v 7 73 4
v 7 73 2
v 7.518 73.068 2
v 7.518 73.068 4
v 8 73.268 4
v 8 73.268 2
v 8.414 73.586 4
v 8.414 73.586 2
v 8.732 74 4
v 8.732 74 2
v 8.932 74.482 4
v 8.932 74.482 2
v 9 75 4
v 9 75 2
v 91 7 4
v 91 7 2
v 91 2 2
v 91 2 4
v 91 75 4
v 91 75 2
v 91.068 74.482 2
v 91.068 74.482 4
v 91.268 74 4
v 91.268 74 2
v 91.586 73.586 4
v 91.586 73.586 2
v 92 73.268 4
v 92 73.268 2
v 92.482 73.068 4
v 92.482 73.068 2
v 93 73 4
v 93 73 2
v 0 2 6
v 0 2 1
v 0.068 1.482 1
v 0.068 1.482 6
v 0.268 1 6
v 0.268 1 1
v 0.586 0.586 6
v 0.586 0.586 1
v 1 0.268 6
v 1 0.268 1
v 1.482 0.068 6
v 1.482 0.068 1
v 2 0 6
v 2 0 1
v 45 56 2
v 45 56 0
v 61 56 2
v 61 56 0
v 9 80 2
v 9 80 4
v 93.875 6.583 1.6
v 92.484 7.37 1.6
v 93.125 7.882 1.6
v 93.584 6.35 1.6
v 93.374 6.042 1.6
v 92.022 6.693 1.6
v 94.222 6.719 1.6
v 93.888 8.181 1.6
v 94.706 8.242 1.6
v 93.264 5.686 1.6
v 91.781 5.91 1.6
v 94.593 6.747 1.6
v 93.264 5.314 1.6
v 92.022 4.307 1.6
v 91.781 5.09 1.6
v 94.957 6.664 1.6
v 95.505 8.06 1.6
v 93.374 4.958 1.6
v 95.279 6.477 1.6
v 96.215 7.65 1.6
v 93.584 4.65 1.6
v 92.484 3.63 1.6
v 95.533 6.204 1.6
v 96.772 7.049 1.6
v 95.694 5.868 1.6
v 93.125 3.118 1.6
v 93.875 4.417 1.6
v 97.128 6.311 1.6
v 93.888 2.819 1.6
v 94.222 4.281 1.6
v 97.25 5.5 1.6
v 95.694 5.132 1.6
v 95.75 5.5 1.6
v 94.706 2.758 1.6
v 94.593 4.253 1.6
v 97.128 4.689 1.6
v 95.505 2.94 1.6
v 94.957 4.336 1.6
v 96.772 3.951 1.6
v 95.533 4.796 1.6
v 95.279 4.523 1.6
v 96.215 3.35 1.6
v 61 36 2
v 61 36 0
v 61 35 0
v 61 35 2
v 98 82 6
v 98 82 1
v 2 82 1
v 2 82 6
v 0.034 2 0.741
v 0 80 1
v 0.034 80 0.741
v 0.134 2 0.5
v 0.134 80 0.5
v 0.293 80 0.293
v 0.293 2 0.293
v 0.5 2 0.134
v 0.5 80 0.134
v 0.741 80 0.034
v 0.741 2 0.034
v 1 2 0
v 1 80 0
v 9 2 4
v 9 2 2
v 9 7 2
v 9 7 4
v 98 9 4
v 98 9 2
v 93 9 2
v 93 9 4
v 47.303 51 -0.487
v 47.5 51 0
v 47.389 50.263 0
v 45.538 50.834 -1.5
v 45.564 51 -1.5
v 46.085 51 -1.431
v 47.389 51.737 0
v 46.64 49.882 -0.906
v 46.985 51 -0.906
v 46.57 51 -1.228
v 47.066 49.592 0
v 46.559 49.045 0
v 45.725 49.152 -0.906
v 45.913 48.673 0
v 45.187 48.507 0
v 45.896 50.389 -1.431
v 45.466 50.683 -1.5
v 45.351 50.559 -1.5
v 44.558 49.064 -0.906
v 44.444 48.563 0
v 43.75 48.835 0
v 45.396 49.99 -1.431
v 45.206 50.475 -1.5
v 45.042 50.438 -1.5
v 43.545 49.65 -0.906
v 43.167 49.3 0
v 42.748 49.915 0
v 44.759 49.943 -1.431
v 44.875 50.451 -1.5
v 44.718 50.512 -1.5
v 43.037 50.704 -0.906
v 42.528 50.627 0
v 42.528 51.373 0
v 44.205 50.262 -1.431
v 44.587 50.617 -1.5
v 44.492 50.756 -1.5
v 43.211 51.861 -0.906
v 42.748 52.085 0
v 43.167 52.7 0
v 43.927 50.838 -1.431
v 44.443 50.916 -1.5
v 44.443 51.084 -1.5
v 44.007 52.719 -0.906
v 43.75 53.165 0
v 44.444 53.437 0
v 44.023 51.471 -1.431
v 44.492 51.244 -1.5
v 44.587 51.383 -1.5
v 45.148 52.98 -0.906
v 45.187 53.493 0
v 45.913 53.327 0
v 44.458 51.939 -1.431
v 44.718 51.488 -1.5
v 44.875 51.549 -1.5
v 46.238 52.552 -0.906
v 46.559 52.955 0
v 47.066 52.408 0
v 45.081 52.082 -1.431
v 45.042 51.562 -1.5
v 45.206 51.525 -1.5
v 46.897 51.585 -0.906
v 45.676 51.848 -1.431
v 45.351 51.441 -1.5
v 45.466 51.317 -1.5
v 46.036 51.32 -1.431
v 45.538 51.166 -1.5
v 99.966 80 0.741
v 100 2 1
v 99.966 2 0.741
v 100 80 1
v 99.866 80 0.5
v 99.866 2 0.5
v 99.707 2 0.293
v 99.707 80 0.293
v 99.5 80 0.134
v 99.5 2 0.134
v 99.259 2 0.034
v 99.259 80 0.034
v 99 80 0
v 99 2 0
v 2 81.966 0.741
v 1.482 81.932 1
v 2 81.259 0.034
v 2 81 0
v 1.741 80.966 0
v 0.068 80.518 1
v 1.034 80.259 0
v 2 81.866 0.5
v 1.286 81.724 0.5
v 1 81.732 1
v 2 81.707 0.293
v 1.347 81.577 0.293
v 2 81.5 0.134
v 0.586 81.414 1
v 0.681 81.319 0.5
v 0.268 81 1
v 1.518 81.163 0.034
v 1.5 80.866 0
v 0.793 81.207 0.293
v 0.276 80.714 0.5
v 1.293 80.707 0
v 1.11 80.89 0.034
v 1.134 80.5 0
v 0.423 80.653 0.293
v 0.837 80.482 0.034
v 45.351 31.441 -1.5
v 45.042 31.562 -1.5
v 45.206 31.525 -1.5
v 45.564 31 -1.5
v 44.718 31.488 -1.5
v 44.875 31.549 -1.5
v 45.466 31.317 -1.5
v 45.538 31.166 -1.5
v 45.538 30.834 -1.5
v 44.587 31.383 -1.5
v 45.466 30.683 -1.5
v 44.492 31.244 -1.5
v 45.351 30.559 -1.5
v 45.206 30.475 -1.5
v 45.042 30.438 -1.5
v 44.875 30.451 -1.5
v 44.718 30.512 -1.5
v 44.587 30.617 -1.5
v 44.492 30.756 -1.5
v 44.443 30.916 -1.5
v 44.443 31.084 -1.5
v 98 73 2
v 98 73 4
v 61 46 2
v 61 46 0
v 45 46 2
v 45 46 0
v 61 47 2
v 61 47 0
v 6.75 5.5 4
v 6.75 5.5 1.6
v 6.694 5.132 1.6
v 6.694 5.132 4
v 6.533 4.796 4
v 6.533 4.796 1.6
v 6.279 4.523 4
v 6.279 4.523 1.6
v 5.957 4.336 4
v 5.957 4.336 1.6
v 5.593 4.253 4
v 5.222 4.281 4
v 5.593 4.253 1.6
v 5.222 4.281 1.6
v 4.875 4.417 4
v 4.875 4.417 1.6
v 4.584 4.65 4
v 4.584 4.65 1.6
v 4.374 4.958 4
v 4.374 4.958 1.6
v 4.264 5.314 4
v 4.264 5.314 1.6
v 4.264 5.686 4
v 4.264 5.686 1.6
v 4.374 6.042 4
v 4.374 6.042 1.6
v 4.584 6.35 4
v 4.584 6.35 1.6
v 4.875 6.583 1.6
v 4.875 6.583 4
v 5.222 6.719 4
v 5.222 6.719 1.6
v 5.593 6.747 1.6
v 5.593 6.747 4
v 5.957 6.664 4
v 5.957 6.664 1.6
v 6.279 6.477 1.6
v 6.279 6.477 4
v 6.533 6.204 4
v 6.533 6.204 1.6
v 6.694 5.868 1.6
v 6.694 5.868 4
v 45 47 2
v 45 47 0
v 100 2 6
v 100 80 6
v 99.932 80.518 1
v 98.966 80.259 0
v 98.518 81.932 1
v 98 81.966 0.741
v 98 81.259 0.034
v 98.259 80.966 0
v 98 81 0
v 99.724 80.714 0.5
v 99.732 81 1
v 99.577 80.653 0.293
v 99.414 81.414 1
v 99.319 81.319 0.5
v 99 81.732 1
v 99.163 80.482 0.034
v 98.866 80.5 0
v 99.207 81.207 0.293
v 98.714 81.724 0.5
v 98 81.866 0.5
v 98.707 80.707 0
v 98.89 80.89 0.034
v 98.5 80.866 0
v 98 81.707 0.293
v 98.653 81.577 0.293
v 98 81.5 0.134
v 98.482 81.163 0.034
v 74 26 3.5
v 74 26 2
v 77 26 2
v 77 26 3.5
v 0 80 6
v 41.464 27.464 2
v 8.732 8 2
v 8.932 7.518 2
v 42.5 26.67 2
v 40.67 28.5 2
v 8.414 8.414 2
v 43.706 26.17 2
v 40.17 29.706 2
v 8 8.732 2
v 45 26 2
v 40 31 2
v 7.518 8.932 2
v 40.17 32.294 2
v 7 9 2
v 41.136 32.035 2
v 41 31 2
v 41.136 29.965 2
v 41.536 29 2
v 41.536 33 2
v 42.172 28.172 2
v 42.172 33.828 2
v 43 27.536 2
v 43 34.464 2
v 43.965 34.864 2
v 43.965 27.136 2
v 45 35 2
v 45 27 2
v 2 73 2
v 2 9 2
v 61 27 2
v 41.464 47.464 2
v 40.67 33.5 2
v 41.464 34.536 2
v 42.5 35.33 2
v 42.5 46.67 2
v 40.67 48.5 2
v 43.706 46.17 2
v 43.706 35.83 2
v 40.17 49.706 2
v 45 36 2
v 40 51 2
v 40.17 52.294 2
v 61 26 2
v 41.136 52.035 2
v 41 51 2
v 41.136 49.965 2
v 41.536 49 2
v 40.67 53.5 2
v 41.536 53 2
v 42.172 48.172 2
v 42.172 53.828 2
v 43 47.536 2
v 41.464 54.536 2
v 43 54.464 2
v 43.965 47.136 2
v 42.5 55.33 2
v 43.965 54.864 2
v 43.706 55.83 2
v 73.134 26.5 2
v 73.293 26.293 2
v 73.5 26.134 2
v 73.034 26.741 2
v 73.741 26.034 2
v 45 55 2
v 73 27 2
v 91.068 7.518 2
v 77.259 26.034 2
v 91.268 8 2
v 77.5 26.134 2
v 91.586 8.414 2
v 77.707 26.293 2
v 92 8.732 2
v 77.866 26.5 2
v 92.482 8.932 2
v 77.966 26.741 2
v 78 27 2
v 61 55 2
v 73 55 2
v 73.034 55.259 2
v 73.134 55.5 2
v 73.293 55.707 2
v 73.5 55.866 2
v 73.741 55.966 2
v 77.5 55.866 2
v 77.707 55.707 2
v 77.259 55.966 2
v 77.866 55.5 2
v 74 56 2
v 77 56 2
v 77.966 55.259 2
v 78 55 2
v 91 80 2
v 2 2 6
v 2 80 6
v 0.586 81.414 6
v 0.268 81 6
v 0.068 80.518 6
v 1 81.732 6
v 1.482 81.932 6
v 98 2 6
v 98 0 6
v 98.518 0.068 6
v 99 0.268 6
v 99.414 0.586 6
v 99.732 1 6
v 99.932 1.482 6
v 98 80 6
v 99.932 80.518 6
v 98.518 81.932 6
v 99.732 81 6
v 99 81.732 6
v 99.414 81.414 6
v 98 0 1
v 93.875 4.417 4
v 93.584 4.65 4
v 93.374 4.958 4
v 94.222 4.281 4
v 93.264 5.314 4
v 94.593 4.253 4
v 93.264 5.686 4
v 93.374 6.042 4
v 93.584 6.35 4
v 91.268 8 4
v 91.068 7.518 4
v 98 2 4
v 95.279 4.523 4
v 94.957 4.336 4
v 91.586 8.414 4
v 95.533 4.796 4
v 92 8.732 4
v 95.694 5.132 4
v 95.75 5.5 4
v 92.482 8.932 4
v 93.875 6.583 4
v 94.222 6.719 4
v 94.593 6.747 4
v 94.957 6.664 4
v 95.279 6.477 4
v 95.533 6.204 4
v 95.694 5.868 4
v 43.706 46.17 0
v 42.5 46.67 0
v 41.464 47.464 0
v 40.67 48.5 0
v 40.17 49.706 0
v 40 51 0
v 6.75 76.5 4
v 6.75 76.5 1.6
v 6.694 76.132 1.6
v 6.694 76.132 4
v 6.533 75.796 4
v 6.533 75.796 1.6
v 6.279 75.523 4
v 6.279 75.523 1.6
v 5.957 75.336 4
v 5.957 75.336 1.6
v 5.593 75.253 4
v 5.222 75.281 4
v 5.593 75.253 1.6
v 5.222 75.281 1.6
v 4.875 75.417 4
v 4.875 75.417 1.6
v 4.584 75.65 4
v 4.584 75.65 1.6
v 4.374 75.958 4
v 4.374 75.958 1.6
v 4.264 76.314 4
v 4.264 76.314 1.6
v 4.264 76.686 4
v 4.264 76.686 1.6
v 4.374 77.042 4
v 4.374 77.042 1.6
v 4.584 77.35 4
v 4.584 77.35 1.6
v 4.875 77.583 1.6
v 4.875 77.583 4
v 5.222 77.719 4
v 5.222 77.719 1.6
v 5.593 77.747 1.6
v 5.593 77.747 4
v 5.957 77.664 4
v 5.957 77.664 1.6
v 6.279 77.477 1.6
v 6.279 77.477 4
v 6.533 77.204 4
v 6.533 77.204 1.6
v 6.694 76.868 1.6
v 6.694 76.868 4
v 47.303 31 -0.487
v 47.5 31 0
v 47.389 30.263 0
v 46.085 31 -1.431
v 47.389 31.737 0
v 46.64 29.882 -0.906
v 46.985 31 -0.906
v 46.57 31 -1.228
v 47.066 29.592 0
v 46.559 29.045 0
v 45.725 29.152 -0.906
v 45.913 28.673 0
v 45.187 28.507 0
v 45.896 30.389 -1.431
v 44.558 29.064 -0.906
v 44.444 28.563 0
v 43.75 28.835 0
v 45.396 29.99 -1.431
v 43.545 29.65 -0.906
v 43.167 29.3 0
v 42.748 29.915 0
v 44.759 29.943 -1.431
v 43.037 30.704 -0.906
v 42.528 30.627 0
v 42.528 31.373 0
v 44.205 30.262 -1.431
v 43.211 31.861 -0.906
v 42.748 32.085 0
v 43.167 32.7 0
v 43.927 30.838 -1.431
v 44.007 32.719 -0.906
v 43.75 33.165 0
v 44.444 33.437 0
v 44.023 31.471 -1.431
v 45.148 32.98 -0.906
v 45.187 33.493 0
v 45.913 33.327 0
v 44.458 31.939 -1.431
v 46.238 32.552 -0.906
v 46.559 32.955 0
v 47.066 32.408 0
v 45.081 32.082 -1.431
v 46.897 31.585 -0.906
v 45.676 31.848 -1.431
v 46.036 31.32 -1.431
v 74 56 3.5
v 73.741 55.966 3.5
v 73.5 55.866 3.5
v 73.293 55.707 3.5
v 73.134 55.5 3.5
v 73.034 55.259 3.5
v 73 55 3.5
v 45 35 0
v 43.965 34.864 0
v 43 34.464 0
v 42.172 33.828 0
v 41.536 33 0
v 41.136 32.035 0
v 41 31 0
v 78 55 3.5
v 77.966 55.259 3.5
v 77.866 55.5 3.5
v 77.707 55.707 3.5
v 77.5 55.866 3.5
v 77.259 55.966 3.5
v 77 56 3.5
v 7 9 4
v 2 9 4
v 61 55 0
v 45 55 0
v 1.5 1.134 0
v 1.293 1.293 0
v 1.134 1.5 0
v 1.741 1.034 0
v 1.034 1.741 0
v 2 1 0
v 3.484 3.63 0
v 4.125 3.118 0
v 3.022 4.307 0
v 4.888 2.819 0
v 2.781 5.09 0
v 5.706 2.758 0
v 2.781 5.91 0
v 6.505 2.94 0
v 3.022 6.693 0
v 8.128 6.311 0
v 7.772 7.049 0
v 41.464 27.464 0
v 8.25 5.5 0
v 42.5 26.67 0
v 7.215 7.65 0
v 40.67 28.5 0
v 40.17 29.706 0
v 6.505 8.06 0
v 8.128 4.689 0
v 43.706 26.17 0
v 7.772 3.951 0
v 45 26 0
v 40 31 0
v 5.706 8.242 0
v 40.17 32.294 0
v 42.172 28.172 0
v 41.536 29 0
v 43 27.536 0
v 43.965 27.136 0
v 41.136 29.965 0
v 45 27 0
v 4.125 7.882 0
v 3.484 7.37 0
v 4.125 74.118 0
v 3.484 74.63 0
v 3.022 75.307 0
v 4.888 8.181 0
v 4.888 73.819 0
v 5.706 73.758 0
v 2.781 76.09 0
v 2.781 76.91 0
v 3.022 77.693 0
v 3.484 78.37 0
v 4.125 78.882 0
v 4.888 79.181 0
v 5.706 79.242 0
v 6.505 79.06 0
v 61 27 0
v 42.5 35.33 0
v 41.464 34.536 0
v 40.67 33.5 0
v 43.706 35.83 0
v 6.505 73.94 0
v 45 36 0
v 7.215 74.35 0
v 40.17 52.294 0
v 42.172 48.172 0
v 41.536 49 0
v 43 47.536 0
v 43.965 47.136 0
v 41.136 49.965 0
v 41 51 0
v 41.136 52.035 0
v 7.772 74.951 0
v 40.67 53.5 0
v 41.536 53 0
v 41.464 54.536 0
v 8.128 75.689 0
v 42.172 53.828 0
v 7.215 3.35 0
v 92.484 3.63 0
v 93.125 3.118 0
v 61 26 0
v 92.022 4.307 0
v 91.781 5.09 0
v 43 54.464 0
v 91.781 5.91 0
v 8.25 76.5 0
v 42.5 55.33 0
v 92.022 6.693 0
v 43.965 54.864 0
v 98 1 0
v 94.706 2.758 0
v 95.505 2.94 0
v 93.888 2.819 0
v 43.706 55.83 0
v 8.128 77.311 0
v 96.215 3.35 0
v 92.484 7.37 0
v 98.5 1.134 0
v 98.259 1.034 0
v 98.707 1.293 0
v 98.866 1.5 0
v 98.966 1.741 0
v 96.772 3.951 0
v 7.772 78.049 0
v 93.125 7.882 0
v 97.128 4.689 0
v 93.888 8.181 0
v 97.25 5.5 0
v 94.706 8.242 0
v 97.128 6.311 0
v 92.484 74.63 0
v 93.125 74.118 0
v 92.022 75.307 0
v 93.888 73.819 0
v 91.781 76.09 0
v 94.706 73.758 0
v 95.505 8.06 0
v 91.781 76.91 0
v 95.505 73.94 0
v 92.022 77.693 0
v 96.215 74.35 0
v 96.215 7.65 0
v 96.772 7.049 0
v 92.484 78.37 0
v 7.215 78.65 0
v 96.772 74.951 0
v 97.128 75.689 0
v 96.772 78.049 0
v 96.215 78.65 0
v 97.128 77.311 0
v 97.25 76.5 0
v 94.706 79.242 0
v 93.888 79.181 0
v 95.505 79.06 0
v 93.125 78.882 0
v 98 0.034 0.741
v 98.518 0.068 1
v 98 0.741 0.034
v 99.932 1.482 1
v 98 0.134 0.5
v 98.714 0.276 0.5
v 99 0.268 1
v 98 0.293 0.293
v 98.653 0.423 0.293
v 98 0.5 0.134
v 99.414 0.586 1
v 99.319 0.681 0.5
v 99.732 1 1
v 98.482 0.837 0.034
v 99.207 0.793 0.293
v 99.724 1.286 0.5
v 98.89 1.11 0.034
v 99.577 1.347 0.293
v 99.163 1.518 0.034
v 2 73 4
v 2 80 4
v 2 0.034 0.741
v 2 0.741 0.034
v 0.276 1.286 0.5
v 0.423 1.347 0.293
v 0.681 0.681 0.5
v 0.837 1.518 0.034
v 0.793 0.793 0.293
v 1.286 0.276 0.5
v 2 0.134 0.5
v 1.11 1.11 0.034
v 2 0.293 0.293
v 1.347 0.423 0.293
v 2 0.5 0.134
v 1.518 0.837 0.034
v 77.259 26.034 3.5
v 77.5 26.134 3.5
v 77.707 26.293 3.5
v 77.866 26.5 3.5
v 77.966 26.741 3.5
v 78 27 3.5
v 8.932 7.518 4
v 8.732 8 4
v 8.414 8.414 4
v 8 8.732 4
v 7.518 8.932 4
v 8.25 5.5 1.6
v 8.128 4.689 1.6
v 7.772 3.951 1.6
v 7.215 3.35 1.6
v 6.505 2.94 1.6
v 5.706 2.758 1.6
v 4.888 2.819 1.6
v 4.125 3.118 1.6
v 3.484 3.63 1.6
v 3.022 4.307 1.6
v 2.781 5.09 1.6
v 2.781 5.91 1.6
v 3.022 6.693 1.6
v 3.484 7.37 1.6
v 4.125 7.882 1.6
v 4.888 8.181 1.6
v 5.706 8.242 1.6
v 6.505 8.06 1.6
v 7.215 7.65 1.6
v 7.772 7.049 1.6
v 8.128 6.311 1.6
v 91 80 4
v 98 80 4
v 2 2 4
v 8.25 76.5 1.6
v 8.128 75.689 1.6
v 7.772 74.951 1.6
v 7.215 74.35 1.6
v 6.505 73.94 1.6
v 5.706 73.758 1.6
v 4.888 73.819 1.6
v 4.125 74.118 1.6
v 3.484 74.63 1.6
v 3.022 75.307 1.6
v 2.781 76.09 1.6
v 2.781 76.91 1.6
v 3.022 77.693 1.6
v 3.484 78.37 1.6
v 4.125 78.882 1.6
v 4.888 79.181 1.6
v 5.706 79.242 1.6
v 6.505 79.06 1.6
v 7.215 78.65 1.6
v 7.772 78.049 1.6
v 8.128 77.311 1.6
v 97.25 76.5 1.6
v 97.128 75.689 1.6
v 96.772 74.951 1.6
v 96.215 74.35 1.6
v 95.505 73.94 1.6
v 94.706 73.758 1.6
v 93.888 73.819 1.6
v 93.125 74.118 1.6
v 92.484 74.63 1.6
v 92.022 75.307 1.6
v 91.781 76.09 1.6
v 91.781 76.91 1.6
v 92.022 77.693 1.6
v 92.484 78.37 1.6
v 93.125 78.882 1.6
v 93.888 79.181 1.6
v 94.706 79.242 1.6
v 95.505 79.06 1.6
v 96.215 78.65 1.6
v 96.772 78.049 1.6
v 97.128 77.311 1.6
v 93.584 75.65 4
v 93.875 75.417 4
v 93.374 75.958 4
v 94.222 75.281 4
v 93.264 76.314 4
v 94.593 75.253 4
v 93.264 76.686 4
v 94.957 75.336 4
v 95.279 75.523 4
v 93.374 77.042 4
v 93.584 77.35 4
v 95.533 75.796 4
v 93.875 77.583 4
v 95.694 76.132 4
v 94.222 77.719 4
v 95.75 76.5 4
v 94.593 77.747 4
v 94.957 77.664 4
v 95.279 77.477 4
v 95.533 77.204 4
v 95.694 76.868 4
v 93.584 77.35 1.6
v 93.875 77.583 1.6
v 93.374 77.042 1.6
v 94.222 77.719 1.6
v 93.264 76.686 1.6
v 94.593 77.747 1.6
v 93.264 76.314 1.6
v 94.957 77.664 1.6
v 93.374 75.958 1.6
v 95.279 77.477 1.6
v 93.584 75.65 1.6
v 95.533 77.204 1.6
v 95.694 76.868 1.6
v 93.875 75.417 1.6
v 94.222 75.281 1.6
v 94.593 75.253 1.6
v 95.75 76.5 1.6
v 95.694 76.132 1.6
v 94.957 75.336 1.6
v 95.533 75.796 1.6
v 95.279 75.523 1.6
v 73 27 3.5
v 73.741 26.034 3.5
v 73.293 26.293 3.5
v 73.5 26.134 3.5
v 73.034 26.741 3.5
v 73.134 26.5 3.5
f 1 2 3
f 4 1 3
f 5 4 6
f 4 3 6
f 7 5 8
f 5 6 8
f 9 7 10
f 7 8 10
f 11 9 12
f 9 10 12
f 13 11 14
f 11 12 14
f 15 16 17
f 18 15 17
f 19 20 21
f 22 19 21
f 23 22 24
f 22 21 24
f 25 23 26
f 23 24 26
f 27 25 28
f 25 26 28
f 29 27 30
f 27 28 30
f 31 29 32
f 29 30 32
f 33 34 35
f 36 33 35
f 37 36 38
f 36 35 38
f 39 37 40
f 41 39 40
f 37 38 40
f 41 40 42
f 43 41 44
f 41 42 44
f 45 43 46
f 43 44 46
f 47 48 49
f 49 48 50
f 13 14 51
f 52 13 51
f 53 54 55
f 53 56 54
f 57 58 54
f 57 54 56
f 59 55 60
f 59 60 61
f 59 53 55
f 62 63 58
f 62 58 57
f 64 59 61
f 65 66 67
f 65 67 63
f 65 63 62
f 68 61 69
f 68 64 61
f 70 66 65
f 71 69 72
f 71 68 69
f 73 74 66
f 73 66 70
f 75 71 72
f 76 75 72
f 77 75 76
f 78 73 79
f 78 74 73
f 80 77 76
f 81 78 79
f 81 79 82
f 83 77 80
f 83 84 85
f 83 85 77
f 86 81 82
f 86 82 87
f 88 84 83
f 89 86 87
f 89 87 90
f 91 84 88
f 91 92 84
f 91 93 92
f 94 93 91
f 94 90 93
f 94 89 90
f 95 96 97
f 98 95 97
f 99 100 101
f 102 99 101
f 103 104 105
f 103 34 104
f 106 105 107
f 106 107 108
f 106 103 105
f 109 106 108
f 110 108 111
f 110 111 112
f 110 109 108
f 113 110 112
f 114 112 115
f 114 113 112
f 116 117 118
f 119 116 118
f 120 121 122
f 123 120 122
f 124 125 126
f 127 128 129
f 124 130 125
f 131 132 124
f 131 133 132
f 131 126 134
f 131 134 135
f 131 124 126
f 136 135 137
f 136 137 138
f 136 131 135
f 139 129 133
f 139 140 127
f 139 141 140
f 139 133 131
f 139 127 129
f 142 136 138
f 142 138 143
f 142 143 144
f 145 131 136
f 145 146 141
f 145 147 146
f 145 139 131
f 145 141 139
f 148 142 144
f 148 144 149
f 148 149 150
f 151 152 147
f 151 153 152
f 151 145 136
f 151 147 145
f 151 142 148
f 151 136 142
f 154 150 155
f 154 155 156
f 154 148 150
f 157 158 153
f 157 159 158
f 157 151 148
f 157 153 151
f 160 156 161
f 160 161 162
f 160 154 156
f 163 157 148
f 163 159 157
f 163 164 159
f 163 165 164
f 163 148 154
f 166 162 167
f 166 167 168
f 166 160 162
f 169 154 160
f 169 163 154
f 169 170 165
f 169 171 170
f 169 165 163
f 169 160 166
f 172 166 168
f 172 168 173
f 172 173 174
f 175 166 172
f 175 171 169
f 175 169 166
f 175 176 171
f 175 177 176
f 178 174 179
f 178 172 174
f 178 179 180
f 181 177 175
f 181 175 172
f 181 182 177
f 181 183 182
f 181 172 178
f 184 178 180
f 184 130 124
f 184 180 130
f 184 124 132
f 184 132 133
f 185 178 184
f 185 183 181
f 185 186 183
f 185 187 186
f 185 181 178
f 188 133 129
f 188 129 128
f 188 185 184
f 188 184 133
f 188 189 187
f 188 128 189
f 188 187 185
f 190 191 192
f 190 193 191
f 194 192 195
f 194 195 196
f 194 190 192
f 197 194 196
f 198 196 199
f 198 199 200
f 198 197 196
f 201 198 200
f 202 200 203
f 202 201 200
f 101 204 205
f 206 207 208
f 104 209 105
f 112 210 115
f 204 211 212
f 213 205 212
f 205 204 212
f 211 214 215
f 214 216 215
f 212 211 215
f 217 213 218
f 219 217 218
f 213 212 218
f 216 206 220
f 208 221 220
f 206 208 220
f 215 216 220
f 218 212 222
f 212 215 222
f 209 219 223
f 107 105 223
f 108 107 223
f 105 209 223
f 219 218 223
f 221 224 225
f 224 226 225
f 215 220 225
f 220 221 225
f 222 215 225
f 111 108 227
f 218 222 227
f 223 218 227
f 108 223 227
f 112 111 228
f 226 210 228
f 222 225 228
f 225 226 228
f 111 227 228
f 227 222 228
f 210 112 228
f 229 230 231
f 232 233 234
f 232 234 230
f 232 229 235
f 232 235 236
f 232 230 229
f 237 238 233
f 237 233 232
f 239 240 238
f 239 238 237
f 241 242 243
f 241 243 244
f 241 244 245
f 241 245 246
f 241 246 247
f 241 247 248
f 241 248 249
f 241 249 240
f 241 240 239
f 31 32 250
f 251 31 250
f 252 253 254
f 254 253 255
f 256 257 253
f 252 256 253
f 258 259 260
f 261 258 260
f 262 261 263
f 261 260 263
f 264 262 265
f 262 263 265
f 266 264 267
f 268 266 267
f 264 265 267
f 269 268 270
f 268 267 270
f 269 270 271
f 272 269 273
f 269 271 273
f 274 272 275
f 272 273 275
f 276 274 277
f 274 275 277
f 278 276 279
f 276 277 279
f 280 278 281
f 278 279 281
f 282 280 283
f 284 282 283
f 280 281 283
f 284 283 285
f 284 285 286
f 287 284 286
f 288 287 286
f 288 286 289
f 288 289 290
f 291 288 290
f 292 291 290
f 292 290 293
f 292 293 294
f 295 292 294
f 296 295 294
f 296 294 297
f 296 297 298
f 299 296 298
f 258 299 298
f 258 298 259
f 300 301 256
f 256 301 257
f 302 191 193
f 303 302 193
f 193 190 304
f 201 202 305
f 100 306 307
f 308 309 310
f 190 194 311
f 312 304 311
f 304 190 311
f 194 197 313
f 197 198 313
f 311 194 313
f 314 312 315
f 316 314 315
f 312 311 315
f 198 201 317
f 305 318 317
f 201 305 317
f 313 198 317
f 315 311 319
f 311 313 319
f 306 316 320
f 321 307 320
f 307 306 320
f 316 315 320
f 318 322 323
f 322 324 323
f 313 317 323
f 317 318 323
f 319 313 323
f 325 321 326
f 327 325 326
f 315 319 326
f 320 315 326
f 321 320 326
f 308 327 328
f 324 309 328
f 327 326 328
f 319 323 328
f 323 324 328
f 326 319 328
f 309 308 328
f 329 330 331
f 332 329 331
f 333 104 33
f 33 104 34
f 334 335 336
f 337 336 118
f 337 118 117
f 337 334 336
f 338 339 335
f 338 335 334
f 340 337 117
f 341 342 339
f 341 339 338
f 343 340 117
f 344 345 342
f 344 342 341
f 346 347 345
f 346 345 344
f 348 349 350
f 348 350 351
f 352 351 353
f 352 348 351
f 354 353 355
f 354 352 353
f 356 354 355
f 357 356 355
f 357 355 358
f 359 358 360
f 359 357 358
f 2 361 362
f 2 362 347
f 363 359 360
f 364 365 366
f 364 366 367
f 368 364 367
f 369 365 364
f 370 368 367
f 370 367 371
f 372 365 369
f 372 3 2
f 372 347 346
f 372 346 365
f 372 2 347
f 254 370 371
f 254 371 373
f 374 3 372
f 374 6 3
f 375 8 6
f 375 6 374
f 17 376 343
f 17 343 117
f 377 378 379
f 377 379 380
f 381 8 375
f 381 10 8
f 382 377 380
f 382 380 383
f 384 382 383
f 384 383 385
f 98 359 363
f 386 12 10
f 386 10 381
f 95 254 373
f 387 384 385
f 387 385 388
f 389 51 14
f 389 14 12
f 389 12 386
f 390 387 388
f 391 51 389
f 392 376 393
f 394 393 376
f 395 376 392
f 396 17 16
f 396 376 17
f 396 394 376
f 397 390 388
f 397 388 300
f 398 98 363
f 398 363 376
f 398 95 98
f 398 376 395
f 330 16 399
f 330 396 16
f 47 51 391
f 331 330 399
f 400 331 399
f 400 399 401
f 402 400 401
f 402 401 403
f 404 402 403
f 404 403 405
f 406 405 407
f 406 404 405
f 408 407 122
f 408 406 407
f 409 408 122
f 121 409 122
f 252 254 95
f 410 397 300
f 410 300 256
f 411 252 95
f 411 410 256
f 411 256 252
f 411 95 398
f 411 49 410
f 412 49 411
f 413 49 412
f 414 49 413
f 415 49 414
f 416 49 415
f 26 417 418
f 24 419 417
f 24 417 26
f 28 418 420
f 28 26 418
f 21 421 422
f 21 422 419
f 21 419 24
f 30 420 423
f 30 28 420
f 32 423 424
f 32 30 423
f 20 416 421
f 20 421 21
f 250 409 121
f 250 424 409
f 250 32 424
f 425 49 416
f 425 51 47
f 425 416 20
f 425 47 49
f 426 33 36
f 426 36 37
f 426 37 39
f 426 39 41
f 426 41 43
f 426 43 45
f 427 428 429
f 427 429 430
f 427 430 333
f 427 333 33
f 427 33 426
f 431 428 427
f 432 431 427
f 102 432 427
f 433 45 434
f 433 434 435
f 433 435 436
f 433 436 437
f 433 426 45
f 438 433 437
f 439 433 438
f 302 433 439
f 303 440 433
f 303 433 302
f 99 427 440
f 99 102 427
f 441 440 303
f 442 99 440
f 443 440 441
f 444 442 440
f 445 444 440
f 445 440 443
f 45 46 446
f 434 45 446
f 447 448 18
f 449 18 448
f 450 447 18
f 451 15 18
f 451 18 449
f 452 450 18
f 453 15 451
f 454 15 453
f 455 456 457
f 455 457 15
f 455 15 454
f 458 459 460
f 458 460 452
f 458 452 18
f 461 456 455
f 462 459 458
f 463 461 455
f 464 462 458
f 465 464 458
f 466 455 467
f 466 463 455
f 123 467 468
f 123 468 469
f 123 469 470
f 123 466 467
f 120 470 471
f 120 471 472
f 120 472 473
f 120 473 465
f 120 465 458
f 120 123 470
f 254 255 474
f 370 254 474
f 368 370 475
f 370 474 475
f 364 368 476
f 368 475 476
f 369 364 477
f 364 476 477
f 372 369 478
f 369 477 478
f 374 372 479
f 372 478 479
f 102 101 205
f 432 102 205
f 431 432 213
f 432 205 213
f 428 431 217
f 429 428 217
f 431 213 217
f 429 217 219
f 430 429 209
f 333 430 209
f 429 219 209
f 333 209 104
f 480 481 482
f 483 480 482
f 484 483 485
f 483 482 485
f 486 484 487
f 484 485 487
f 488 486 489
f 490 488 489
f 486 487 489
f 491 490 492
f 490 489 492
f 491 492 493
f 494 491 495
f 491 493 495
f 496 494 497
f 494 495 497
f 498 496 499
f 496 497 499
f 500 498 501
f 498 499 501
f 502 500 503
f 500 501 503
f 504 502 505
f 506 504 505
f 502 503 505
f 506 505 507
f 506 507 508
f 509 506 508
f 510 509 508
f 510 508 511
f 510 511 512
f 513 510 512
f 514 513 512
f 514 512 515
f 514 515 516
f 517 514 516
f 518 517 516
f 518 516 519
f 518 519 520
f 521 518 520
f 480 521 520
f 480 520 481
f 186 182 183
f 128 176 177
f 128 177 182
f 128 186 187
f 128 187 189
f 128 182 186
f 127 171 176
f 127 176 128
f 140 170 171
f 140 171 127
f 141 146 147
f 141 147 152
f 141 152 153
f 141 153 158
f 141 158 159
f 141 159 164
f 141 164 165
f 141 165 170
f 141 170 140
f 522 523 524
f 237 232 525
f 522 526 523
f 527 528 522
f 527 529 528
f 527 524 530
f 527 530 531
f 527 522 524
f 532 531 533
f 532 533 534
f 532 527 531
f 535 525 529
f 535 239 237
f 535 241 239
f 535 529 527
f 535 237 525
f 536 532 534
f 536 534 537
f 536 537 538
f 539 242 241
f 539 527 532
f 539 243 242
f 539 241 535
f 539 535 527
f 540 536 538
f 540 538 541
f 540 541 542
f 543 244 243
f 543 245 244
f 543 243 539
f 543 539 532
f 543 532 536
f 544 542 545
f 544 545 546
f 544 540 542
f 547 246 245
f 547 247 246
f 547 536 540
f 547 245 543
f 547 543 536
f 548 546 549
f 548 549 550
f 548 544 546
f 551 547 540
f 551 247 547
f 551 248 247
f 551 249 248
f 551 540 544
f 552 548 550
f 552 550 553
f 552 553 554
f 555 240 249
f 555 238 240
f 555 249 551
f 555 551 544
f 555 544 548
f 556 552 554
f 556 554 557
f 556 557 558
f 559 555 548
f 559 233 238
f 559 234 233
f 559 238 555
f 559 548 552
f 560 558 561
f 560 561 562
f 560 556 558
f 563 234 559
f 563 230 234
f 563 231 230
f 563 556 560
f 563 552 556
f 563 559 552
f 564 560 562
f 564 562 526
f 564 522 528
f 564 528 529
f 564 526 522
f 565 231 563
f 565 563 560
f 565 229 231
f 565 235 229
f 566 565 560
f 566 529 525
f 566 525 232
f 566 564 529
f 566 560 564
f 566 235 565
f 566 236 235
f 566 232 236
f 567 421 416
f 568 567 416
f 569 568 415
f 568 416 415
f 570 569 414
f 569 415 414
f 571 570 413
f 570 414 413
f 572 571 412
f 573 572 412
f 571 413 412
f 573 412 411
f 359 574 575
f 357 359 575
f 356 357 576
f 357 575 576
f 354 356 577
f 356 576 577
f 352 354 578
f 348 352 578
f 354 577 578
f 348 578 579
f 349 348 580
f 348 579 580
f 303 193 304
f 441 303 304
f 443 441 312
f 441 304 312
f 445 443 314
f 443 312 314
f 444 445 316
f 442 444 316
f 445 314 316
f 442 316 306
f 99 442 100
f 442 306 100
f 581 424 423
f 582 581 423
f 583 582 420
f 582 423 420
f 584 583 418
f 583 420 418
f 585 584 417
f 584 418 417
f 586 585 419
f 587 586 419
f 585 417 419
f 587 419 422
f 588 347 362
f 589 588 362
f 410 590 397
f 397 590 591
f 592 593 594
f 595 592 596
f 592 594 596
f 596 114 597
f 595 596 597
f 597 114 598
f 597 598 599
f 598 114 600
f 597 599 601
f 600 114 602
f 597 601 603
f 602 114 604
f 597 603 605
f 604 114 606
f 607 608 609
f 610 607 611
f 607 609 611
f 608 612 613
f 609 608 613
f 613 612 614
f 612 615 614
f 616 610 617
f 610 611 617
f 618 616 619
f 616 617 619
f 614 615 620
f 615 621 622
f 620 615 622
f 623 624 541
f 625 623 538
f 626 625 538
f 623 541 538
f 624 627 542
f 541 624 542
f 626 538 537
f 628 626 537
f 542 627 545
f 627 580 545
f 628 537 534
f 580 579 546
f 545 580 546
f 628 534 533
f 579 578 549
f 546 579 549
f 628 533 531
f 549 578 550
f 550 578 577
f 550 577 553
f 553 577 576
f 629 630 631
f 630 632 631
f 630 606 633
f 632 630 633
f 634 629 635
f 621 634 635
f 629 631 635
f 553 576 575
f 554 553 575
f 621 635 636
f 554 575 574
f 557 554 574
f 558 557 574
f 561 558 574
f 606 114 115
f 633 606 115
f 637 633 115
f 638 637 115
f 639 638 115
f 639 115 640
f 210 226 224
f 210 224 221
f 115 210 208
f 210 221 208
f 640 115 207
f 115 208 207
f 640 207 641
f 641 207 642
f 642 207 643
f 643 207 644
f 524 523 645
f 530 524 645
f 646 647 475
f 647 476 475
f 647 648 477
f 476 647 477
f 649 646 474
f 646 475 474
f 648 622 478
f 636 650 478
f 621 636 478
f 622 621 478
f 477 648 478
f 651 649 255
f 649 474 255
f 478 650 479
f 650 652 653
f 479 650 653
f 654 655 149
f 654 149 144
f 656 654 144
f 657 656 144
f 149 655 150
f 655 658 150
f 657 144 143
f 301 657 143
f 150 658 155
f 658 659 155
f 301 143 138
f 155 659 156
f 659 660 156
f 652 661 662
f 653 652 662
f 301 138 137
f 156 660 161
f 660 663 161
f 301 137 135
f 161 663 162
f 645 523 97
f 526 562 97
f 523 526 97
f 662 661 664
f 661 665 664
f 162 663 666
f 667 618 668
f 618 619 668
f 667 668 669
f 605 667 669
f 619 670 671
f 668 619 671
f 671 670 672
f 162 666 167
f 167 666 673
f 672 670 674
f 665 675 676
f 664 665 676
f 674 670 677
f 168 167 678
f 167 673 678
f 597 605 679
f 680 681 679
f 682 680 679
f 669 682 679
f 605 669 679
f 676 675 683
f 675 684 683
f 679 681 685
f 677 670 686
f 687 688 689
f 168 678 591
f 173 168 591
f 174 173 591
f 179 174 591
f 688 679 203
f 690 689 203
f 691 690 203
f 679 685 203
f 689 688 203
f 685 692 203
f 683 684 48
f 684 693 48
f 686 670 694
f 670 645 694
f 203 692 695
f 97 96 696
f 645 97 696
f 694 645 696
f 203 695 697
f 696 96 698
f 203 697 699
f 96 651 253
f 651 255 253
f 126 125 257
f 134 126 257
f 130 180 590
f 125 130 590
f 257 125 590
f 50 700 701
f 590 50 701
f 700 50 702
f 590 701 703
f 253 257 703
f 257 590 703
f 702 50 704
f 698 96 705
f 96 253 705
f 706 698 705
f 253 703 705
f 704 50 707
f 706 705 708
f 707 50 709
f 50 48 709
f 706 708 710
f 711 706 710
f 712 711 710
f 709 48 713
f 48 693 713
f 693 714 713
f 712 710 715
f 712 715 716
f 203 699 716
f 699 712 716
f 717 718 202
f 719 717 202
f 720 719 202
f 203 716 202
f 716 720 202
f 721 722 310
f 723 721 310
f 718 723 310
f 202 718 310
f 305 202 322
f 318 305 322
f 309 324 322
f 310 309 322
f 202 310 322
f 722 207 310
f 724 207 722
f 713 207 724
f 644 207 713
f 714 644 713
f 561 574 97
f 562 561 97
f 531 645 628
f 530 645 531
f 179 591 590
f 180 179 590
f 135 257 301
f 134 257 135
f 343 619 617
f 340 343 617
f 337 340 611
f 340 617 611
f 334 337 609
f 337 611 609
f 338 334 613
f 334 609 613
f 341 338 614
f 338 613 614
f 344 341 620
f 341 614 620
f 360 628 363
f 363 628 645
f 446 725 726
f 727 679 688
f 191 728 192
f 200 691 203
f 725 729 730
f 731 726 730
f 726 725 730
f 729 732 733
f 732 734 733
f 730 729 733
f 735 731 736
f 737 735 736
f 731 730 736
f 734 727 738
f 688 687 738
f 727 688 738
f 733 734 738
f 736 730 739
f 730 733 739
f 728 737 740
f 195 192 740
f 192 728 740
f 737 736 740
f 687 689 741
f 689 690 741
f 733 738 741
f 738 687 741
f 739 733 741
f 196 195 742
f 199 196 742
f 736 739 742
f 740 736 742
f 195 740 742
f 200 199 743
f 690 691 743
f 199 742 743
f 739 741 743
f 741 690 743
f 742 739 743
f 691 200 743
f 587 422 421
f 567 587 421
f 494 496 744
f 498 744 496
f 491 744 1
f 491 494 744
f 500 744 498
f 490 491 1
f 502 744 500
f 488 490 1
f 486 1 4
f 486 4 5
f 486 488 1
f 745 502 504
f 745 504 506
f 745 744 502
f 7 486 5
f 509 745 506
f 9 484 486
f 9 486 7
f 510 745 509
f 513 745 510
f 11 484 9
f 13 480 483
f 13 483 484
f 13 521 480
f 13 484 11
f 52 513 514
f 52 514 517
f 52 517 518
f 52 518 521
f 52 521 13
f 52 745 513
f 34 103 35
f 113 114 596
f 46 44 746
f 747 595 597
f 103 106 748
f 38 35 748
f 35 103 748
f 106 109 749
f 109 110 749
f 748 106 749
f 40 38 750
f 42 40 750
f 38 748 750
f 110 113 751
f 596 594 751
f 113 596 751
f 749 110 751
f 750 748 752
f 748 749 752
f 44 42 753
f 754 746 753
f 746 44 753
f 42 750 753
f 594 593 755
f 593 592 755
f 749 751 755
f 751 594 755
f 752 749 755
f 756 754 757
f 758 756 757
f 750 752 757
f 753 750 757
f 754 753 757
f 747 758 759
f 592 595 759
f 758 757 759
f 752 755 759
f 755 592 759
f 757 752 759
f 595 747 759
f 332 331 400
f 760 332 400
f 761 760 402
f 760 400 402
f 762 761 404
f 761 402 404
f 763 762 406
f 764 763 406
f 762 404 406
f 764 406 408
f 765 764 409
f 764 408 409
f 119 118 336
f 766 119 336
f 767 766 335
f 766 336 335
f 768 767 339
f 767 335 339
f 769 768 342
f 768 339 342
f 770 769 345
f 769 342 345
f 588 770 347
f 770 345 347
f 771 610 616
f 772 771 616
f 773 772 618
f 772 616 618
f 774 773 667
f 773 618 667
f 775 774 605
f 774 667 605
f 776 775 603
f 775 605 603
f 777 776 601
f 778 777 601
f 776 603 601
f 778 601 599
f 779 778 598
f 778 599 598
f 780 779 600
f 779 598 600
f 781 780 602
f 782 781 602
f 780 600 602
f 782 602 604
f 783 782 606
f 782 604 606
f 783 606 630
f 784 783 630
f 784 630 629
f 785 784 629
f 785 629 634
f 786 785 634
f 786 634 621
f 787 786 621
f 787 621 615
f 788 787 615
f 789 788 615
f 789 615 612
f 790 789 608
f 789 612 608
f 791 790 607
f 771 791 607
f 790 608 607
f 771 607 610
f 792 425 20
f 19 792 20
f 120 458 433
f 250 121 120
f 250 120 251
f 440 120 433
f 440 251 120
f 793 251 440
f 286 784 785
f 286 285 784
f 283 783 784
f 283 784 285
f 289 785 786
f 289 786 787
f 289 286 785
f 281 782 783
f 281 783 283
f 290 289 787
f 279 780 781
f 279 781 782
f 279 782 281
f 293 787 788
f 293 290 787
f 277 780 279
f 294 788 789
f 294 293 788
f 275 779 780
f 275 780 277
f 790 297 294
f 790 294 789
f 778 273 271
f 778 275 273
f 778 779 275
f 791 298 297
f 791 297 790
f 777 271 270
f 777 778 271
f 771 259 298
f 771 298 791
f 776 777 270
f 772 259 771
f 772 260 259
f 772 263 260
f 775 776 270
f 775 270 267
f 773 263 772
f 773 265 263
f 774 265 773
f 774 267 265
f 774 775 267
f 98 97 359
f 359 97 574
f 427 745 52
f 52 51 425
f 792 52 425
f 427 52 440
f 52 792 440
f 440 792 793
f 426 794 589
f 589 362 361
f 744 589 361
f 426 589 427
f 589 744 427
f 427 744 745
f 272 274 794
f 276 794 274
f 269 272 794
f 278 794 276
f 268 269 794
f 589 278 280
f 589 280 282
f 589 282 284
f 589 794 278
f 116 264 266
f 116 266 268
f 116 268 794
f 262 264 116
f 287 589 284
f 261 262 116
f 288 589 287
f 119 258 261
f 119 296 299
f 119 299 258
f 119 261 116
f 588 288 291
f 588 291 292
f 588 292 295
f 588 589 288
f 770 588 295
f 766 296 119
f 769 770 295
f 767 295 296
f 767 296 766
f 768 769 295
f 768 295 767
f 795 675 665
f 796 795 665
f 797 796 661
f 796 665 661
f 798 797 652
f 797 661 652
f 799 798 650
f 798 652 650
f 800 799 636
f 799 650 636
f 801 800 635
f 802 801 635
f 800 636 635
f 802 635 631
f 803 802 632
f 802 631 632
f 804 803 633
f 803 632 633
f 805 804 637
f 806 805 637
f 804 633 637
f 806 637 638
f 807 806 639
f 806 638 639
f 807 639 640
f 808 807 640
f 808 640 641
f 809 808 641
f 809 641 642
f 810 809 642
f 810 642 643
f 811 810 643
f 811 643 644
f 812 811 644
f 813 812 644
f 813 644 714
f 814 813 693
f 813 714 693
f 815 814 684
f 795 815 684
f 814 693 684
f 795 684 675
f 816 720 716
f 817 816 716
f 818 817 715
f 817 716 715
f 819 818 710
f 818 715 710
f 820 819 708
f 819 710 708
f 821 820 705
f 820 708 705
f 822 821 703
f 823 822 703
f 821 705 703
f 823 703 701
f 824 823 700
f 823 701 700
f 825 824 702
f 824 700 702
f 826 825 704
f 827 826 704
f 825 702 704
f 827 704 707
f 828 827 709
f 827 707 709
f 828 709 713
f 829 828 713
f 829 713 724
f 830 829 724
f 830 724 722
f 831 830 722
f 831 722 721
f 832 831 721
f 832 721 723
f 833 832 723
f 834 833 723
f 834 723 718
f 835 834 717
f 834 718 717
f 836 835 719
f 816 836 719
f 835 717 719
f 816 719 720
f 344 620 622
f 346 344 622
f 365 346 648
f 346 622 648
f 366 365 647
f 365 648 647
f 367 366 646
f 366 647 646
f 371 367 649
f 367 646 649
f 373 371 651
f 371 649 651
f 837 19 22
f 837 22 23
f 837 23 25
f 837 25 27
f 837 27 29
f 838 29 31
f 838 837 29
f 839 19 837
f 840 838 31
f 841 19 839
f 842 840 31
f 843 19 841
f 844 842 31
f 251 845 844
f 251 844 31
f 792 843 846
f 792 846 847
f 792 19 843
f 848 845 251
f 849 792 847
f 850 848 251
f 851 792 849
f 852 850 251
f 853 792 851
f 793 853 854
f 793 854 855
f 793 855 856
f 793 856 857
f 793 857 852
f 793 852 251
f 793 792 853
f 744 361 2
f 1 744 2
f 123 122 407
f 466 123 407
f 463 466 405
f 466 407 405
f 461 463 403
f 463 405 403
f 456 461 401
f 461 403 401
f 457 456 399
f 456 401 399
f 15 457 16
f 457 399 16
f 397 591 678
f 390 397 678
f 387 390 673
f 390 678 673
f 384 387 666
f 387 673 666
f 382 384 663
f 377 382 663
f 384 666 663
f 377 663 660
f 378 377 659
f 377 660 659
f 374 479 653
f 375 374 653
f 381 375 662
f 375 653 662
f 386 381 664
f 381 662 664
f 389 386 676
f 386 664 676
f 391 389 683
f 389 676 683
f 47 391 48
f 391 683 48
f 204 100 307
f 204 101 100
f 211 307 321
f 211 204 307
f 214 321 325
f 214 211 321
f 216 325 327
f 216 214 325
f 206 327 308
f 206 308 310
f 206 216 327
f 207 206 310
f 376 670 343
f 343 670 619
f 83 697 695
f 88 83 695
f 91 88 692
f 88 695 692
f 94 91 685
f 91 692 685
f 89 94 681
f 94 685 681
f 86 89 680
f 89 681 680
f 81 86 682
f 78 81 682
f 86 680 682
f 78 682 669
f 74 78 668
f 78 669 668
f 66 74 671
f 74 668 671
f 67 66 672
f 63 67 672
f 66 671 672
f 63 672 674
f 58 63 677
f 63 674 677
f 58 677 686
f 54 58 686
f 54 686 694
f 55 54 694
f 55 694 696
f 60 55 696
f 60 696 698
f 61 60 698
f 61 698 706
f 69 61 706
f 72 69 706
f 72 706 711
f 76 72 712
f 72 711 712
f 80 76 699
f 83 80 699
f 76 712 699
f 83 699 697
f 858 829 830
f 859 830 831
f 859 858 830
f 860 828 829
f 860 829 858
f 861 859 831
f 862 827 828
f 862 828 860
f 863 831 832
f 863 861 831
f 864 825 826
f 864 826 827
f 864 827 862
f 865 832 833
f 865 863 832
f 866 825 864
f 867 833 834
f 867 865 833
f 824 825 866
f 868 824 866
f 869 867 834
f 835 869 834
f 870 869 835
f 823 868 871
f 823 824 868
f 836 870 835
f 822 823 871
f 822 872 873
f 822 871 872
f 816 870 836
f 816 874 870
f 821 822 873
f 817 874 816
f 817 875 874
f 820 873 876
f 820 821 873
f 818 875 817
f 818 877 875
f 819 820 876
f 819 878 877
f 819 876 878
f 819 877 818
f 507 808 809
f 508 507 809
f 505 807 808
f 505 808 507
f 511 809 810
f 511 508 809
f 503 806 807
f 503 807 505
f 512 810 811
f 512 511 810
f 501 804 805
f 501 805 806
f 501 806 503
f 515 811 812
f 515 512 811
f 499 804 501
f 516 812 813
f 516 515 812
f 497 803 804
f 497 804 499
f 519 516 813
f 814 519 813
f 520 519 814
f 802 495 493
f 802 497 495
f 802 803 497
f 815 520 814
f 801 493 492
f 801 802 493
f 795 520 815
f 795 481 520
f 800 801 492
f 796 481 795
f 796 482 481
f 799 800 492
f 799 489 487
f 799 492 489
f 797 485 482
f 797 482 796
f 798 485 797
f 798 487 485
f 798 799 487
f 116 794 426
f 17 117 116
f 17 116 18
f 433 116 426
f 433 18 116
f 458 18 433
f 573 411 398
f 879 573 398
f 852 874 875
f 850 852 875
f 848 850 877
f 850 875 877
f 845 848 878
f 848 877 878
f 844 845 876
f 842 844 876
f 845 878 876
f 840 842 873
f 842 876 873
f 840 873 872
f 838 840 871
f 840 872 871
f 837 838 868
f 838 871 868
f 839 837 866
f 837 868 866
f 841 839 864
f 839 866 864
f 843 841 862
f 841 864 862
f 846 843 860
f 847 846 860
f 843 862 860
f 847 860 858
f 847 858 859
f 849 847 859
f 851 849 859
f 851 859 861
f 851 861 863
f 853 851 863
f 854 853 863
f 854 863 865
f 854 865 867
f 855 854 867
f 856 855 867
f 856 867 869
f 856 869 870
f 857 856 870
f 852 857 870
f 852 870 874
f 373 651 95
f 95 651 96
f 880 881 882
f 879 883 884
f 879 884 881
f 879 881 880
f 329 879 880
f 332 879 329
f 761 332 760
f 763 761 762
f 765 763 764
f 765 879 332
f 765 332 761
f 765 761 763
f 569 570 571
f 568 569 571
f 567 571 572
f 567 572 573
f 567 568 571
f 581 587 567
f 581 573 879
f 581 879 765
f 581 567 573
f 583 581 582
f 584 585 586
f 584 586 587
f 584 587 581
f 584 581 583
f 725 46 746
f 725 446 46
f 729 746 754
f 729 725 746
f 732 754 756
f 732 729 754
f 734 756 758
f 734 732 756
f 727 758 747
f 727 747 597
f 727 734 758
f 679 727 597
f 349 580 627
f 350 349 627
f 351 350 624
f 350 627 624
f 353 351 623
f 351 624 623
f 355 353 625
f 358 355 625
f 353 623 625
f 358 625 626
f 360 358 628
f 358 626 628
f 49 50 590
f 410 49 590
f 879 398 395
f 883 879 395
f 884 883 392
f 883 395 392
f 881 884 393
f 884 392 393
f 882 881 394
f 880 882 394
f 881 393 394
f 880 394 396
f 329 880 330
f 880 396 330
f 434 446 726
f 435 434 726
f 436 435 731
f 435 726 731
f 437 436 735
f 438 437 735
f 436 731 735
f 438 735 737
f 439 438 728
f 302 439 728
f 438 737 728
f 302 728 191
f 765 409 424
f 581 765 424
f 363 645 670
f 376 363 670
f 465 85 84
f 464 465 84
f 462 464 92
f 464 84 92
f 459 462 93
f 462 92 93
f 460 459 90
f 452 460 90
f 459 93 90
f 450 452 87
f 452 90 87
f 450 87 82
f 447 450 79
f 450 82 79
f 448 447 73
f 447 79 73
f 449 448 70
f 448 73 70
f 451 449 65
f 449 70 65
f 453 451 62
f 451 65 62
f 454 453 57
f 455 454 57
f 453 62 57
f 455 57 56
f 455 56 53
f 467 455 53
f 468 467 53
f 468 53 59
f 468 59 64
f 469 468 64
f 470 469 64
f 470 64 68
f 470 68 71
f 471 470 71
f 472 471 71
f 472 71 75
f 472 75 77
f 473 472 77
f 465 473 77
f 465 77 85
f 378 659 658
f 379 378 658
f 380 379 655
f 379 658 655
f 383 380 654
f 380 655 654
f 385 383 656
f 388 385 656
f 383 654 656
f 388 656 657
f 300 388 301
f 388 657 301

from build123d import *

# Parameters (mm, degrees)
F1_DEPTH  = 2
F2_W      = 96
F2_H      = 78
F3_DEPTH  = 4
F5_DEPTH  = 2
F6_R      = 1.25
F7_DEPTH  = 6
F8_R      = 2.75
F9_DEPTH  = 1.6
F11_R     = 1
F13_DEPTH = 2
F12_R     = 2.5
F14_DEPTH = 1.5
F16_DEPTH = 1.5


# Not quite as in the source:
# - a fillet or chamfer that OpenCascade refuses, or shapes differently, is made with other operations: its cross-section is extruded or revolved along the edge and cut away or added


with BuildPart() as f1:
    # F0 (on Top) → F1 (new body)
    with BuildSketch(Plane.XY):
        with BuildLine():
            ThreePointArc((0, 2), (0.5857864376, 0.5857864376), (2, 0))
            Line((2, 0), (98, 0))
            ThreePointArc((98, 0), (99.4142135624, 0.5857864376), (100, 2))
            Line((100, 2), (100, 80))
            ThreePointArc((100, 80), (99.4142135624, 81.4142135624), (98, 82))
            Line((98, 82), (2, 82))
            ThreePointArc((2, 82), (0.5857864376, 81.4142135624), (0, 80))
            Line((0, 80), (0, 2))
        make_face()
    extrude(amount=F1_DEPTH)

    # F2 (on face) → F3 (join)
    with BuildSketch(Plane.XY.offset(2)):
        with BuildLine():
            ThreePointArc((2, 82), (0.5857864376, 81.4142135624), (0, 80))
            Line((0, 80), (0, 2))
            ThreePointArc((0, 2), (0.5857864376, 0.5857864376), (2, 0))
            Line((2, 0), (98, 0))
            ThreePointArc((98, 0), (99.4142135624, 0.5857864376), (100, 2))
            Line((100, 2), (100, 80))
            ThreePointArc((100, 80), (99.4142135624, 81.4142135624), (98, 82))
            Line((98, 82), (2, 82))
        make_face()
        with Locations((50, 41)):
            Rectangle(F2_W, F2_H, mode=Mode.SUBTRACT)
    extrude(amount=F3_DEPTH)

    # F4 (on face) → F5 (join)
    with BuildSketch(Plane.XY.offset(2)):
        with BuildLine():
            Line((2, 9), (2, 2))
            Line((2, 2), (9, 2))
            Line((9, 2), (9, 7))
            ThreePointArc((9, 7), (8.4142135624, 8.4142135624), (7, 9))
            Line((7, 9), (2, 9))
        make_face()
        with BuildLine():
            Line((9, 80), (2, 80))
            Line((2, 80), (2, 73))
            Line((2, 73), (7, 73))
            ThreePointArc((7, 73), (8.4142135624, 73.5857864376), (9, 75))
            Line((9, 75), (9, 80))
        make_face()
        with BuildLine():
            Line((91, 2), (98, 2))
            Line((98, 2), (98, 9))
            Line((98, 9), (93, 9))
            ThreePointArc((93, 9), (91.5857864376, 8.4142135624), (91, 7))
            Line((91, 7), (91, 2))
        make_face()
        with BuildLine():
            Line((98, 73), (98, 80))
            Line((98, 80), (91, 80))
            Line((91, 80), (91, 75))
            ThreePointArc((91, 75), (91.5857864376, 73.5857864376), (93, 73))
            Line((93, 73), (98, 73))
        make_face()
    extrude(amount=F5_DEPTH)

    # F6 (on face) → F7 (cut)
    with BuildSketch(Plane(origin=(0, 0, 0), x_dir=(1, 0, 0), z_dir=(0, 0, -1))):
        with Locations((94.5, -5.5)):
            Circle(F6_R)
        with Locations((94.5, -76.5)):
            Circle(F6_R)
        with Locations((5.5, -76.5)):
            Circle(F6_R)
        with Locations((5.5, -5.5)):
            Circle(F6_R)
    extrude(amount=-F7_DEPTH, mode=Mode.SUBTRACT)

    # F8 (on face) → F9 (cut)
    with BuildSketch(Plane(origin=(0, 0, 0), x_dir=(1, 0, 0), z_dir=(0, 0, -1))):
        with Locations((5.5, -76.5)):
            Circle(F8_R)
        with Locations((5.5, -5.5)):
            Circle(F8_R)
        with Locations((94.5, -5.5)):
            Circle(F8_R)
        with Locations((94.5, -76.5)):
            Circle(F8_R)
    extrude(amount=-F9_DEPTH, mode=Mode.SUBTRACT)

    # F11
    f11_edges = [f1.edges().sort_by_distance(p)[0] for p in [
        (50, 82, 0),
        (0, 41, 0),
        (0.585786, 81.414214, 0),
        (0.585786, 0.585786, 0),
        (50, 0, 0),
        (99.414214, 81.414214, 0),
        (99.414214, 0.585786, 0),
        (100, 41, 0),
    ]]
    fillet(f11_edges, radius=F11_R)

    # F12 (on face) → F13 (cut)
    with BuildSketch(Plane(origin=(0, 0, 0), x_dir=(1, 0, 0), z_dir=(0, 0, -1))):
        with BuildLine():
            Line((61, -26), (45, -26))
            ThreePointArc((45, -26), (41.4644660941, -27.4644660941), (40, -31))
            ThreePointArc((40, -31), (41.4644660941, -34.5355339059), (45, -36))
            Line((45, -36), (61, -36))
            Line((61, -36), (61, -35))
            Line((61, -35), (45, -35))
            ThreePointArc((45, -35), (42.1715728753, -33.8284271247), (41, -31))
            ThreePointArc((41, -31), (42.1715728753, -28.1715728753), (45, -27))
            Line((45, -27), (61, -27))
            Line((61, -27), (61, -26))
        make_face()
        with BuildLine():
            Line((61, -46), (45, -46))
            ThreePointArc((45, -46), (41.4644660941, -47.4644660941), (40, -51))
            ThreePointArc((40, -51), (41.4644660941, -54.5355339059), (45, -56))
            Line((45, -56), (61, -56))
            Line((61, -56), (61, -55))
            Line((61, -55), (45, -55))
            ThreePointArc((45, -55), (42.1715728753, -53.8284271247), (41, -51))
            ThreePointArc((41, -51), (42.1715728753, -48.1715728753), (45, -47))
            Line((45, -47), (61, -47))
            Line((61, -47), (61, -46))
        make_face()
    extrude(amount=-F13_DEPTH, mode=Mode.SUBTRACT)

    # F12 (on face) → F14 (join)
    with BuildSketch(Plane(origin=(0, 0, 0), x_dir=(1, 0, 0), z_dir=(0, 0, -1))):
        with Locations((45, -51)):
            Circle(F12_R)
        with Locations((45, -31)):
            Circle(F12_R)
    extrude(amount=F14_DEPTH)

    # F15: fillet of radius 2 on 2 edges, made by hand

    # F15_s1 → F15_t2 (revolve, cut)
    with BuildSketch(Plane.XZ.offset(-51)):
        with BuildLine():
            ThreePointArc((47.5, 0), (46.7882531983, -1.0811388301), (45.5635083269, -1.5))
            Line((45.5635083269, -1.5), (47.5, -1.5))
            Line((47.5, -1.5), (47.5, 0))
        make_face()
    revolve(axis=Axis((45, 51, -1.5), (0, 0, -1)), mode=Mode.SUBTRACT)

    # F15_s3 → F15_t4 (revolve, cut)
    with BuildSketch(Plane.XZ.offset(-31)):
        with BuildLine():
            ThreePointArc((47.5, 0), (46.7882531983, -1.0811388301), (45.5635083269, -1.5))
            Line((45.5635083269, -1.5), (47.5, -1.5))
            Line((47.5, -1.5), (47.5, 0))
        make_face()
    revolve(axis=Axis((45, 31, -1.5), (0, 0, -1)), mode=Mode.SUBTRACT)

    # F10 (on face) → F16 (join)
    with BuildSketch(Plane.XY.offset(2)):
        with BuildLine():
            ThreePointArc((73, 27), (73.2928932188, 26.2928932188), (74, 26))
            Line((74, 26), (77, 26))
            ThreePointArc((77, 26), (77.7071067812, 26.2928932188), (78, 27))
            Line((78, 27), (78, 55))
            ThreePointArc((78, 55), (77.7071067812, 55.7071067812), (77, 56))
            Line((77, 56), (74, 56))
            ThreePointArc((74, 56), (73.2928932188, 55.7071067812), (73, 55))
            Line((73, 55), (73, 27))
        make_face()
    extrude(amount=F16_DEPTH)


solid = f1.part
